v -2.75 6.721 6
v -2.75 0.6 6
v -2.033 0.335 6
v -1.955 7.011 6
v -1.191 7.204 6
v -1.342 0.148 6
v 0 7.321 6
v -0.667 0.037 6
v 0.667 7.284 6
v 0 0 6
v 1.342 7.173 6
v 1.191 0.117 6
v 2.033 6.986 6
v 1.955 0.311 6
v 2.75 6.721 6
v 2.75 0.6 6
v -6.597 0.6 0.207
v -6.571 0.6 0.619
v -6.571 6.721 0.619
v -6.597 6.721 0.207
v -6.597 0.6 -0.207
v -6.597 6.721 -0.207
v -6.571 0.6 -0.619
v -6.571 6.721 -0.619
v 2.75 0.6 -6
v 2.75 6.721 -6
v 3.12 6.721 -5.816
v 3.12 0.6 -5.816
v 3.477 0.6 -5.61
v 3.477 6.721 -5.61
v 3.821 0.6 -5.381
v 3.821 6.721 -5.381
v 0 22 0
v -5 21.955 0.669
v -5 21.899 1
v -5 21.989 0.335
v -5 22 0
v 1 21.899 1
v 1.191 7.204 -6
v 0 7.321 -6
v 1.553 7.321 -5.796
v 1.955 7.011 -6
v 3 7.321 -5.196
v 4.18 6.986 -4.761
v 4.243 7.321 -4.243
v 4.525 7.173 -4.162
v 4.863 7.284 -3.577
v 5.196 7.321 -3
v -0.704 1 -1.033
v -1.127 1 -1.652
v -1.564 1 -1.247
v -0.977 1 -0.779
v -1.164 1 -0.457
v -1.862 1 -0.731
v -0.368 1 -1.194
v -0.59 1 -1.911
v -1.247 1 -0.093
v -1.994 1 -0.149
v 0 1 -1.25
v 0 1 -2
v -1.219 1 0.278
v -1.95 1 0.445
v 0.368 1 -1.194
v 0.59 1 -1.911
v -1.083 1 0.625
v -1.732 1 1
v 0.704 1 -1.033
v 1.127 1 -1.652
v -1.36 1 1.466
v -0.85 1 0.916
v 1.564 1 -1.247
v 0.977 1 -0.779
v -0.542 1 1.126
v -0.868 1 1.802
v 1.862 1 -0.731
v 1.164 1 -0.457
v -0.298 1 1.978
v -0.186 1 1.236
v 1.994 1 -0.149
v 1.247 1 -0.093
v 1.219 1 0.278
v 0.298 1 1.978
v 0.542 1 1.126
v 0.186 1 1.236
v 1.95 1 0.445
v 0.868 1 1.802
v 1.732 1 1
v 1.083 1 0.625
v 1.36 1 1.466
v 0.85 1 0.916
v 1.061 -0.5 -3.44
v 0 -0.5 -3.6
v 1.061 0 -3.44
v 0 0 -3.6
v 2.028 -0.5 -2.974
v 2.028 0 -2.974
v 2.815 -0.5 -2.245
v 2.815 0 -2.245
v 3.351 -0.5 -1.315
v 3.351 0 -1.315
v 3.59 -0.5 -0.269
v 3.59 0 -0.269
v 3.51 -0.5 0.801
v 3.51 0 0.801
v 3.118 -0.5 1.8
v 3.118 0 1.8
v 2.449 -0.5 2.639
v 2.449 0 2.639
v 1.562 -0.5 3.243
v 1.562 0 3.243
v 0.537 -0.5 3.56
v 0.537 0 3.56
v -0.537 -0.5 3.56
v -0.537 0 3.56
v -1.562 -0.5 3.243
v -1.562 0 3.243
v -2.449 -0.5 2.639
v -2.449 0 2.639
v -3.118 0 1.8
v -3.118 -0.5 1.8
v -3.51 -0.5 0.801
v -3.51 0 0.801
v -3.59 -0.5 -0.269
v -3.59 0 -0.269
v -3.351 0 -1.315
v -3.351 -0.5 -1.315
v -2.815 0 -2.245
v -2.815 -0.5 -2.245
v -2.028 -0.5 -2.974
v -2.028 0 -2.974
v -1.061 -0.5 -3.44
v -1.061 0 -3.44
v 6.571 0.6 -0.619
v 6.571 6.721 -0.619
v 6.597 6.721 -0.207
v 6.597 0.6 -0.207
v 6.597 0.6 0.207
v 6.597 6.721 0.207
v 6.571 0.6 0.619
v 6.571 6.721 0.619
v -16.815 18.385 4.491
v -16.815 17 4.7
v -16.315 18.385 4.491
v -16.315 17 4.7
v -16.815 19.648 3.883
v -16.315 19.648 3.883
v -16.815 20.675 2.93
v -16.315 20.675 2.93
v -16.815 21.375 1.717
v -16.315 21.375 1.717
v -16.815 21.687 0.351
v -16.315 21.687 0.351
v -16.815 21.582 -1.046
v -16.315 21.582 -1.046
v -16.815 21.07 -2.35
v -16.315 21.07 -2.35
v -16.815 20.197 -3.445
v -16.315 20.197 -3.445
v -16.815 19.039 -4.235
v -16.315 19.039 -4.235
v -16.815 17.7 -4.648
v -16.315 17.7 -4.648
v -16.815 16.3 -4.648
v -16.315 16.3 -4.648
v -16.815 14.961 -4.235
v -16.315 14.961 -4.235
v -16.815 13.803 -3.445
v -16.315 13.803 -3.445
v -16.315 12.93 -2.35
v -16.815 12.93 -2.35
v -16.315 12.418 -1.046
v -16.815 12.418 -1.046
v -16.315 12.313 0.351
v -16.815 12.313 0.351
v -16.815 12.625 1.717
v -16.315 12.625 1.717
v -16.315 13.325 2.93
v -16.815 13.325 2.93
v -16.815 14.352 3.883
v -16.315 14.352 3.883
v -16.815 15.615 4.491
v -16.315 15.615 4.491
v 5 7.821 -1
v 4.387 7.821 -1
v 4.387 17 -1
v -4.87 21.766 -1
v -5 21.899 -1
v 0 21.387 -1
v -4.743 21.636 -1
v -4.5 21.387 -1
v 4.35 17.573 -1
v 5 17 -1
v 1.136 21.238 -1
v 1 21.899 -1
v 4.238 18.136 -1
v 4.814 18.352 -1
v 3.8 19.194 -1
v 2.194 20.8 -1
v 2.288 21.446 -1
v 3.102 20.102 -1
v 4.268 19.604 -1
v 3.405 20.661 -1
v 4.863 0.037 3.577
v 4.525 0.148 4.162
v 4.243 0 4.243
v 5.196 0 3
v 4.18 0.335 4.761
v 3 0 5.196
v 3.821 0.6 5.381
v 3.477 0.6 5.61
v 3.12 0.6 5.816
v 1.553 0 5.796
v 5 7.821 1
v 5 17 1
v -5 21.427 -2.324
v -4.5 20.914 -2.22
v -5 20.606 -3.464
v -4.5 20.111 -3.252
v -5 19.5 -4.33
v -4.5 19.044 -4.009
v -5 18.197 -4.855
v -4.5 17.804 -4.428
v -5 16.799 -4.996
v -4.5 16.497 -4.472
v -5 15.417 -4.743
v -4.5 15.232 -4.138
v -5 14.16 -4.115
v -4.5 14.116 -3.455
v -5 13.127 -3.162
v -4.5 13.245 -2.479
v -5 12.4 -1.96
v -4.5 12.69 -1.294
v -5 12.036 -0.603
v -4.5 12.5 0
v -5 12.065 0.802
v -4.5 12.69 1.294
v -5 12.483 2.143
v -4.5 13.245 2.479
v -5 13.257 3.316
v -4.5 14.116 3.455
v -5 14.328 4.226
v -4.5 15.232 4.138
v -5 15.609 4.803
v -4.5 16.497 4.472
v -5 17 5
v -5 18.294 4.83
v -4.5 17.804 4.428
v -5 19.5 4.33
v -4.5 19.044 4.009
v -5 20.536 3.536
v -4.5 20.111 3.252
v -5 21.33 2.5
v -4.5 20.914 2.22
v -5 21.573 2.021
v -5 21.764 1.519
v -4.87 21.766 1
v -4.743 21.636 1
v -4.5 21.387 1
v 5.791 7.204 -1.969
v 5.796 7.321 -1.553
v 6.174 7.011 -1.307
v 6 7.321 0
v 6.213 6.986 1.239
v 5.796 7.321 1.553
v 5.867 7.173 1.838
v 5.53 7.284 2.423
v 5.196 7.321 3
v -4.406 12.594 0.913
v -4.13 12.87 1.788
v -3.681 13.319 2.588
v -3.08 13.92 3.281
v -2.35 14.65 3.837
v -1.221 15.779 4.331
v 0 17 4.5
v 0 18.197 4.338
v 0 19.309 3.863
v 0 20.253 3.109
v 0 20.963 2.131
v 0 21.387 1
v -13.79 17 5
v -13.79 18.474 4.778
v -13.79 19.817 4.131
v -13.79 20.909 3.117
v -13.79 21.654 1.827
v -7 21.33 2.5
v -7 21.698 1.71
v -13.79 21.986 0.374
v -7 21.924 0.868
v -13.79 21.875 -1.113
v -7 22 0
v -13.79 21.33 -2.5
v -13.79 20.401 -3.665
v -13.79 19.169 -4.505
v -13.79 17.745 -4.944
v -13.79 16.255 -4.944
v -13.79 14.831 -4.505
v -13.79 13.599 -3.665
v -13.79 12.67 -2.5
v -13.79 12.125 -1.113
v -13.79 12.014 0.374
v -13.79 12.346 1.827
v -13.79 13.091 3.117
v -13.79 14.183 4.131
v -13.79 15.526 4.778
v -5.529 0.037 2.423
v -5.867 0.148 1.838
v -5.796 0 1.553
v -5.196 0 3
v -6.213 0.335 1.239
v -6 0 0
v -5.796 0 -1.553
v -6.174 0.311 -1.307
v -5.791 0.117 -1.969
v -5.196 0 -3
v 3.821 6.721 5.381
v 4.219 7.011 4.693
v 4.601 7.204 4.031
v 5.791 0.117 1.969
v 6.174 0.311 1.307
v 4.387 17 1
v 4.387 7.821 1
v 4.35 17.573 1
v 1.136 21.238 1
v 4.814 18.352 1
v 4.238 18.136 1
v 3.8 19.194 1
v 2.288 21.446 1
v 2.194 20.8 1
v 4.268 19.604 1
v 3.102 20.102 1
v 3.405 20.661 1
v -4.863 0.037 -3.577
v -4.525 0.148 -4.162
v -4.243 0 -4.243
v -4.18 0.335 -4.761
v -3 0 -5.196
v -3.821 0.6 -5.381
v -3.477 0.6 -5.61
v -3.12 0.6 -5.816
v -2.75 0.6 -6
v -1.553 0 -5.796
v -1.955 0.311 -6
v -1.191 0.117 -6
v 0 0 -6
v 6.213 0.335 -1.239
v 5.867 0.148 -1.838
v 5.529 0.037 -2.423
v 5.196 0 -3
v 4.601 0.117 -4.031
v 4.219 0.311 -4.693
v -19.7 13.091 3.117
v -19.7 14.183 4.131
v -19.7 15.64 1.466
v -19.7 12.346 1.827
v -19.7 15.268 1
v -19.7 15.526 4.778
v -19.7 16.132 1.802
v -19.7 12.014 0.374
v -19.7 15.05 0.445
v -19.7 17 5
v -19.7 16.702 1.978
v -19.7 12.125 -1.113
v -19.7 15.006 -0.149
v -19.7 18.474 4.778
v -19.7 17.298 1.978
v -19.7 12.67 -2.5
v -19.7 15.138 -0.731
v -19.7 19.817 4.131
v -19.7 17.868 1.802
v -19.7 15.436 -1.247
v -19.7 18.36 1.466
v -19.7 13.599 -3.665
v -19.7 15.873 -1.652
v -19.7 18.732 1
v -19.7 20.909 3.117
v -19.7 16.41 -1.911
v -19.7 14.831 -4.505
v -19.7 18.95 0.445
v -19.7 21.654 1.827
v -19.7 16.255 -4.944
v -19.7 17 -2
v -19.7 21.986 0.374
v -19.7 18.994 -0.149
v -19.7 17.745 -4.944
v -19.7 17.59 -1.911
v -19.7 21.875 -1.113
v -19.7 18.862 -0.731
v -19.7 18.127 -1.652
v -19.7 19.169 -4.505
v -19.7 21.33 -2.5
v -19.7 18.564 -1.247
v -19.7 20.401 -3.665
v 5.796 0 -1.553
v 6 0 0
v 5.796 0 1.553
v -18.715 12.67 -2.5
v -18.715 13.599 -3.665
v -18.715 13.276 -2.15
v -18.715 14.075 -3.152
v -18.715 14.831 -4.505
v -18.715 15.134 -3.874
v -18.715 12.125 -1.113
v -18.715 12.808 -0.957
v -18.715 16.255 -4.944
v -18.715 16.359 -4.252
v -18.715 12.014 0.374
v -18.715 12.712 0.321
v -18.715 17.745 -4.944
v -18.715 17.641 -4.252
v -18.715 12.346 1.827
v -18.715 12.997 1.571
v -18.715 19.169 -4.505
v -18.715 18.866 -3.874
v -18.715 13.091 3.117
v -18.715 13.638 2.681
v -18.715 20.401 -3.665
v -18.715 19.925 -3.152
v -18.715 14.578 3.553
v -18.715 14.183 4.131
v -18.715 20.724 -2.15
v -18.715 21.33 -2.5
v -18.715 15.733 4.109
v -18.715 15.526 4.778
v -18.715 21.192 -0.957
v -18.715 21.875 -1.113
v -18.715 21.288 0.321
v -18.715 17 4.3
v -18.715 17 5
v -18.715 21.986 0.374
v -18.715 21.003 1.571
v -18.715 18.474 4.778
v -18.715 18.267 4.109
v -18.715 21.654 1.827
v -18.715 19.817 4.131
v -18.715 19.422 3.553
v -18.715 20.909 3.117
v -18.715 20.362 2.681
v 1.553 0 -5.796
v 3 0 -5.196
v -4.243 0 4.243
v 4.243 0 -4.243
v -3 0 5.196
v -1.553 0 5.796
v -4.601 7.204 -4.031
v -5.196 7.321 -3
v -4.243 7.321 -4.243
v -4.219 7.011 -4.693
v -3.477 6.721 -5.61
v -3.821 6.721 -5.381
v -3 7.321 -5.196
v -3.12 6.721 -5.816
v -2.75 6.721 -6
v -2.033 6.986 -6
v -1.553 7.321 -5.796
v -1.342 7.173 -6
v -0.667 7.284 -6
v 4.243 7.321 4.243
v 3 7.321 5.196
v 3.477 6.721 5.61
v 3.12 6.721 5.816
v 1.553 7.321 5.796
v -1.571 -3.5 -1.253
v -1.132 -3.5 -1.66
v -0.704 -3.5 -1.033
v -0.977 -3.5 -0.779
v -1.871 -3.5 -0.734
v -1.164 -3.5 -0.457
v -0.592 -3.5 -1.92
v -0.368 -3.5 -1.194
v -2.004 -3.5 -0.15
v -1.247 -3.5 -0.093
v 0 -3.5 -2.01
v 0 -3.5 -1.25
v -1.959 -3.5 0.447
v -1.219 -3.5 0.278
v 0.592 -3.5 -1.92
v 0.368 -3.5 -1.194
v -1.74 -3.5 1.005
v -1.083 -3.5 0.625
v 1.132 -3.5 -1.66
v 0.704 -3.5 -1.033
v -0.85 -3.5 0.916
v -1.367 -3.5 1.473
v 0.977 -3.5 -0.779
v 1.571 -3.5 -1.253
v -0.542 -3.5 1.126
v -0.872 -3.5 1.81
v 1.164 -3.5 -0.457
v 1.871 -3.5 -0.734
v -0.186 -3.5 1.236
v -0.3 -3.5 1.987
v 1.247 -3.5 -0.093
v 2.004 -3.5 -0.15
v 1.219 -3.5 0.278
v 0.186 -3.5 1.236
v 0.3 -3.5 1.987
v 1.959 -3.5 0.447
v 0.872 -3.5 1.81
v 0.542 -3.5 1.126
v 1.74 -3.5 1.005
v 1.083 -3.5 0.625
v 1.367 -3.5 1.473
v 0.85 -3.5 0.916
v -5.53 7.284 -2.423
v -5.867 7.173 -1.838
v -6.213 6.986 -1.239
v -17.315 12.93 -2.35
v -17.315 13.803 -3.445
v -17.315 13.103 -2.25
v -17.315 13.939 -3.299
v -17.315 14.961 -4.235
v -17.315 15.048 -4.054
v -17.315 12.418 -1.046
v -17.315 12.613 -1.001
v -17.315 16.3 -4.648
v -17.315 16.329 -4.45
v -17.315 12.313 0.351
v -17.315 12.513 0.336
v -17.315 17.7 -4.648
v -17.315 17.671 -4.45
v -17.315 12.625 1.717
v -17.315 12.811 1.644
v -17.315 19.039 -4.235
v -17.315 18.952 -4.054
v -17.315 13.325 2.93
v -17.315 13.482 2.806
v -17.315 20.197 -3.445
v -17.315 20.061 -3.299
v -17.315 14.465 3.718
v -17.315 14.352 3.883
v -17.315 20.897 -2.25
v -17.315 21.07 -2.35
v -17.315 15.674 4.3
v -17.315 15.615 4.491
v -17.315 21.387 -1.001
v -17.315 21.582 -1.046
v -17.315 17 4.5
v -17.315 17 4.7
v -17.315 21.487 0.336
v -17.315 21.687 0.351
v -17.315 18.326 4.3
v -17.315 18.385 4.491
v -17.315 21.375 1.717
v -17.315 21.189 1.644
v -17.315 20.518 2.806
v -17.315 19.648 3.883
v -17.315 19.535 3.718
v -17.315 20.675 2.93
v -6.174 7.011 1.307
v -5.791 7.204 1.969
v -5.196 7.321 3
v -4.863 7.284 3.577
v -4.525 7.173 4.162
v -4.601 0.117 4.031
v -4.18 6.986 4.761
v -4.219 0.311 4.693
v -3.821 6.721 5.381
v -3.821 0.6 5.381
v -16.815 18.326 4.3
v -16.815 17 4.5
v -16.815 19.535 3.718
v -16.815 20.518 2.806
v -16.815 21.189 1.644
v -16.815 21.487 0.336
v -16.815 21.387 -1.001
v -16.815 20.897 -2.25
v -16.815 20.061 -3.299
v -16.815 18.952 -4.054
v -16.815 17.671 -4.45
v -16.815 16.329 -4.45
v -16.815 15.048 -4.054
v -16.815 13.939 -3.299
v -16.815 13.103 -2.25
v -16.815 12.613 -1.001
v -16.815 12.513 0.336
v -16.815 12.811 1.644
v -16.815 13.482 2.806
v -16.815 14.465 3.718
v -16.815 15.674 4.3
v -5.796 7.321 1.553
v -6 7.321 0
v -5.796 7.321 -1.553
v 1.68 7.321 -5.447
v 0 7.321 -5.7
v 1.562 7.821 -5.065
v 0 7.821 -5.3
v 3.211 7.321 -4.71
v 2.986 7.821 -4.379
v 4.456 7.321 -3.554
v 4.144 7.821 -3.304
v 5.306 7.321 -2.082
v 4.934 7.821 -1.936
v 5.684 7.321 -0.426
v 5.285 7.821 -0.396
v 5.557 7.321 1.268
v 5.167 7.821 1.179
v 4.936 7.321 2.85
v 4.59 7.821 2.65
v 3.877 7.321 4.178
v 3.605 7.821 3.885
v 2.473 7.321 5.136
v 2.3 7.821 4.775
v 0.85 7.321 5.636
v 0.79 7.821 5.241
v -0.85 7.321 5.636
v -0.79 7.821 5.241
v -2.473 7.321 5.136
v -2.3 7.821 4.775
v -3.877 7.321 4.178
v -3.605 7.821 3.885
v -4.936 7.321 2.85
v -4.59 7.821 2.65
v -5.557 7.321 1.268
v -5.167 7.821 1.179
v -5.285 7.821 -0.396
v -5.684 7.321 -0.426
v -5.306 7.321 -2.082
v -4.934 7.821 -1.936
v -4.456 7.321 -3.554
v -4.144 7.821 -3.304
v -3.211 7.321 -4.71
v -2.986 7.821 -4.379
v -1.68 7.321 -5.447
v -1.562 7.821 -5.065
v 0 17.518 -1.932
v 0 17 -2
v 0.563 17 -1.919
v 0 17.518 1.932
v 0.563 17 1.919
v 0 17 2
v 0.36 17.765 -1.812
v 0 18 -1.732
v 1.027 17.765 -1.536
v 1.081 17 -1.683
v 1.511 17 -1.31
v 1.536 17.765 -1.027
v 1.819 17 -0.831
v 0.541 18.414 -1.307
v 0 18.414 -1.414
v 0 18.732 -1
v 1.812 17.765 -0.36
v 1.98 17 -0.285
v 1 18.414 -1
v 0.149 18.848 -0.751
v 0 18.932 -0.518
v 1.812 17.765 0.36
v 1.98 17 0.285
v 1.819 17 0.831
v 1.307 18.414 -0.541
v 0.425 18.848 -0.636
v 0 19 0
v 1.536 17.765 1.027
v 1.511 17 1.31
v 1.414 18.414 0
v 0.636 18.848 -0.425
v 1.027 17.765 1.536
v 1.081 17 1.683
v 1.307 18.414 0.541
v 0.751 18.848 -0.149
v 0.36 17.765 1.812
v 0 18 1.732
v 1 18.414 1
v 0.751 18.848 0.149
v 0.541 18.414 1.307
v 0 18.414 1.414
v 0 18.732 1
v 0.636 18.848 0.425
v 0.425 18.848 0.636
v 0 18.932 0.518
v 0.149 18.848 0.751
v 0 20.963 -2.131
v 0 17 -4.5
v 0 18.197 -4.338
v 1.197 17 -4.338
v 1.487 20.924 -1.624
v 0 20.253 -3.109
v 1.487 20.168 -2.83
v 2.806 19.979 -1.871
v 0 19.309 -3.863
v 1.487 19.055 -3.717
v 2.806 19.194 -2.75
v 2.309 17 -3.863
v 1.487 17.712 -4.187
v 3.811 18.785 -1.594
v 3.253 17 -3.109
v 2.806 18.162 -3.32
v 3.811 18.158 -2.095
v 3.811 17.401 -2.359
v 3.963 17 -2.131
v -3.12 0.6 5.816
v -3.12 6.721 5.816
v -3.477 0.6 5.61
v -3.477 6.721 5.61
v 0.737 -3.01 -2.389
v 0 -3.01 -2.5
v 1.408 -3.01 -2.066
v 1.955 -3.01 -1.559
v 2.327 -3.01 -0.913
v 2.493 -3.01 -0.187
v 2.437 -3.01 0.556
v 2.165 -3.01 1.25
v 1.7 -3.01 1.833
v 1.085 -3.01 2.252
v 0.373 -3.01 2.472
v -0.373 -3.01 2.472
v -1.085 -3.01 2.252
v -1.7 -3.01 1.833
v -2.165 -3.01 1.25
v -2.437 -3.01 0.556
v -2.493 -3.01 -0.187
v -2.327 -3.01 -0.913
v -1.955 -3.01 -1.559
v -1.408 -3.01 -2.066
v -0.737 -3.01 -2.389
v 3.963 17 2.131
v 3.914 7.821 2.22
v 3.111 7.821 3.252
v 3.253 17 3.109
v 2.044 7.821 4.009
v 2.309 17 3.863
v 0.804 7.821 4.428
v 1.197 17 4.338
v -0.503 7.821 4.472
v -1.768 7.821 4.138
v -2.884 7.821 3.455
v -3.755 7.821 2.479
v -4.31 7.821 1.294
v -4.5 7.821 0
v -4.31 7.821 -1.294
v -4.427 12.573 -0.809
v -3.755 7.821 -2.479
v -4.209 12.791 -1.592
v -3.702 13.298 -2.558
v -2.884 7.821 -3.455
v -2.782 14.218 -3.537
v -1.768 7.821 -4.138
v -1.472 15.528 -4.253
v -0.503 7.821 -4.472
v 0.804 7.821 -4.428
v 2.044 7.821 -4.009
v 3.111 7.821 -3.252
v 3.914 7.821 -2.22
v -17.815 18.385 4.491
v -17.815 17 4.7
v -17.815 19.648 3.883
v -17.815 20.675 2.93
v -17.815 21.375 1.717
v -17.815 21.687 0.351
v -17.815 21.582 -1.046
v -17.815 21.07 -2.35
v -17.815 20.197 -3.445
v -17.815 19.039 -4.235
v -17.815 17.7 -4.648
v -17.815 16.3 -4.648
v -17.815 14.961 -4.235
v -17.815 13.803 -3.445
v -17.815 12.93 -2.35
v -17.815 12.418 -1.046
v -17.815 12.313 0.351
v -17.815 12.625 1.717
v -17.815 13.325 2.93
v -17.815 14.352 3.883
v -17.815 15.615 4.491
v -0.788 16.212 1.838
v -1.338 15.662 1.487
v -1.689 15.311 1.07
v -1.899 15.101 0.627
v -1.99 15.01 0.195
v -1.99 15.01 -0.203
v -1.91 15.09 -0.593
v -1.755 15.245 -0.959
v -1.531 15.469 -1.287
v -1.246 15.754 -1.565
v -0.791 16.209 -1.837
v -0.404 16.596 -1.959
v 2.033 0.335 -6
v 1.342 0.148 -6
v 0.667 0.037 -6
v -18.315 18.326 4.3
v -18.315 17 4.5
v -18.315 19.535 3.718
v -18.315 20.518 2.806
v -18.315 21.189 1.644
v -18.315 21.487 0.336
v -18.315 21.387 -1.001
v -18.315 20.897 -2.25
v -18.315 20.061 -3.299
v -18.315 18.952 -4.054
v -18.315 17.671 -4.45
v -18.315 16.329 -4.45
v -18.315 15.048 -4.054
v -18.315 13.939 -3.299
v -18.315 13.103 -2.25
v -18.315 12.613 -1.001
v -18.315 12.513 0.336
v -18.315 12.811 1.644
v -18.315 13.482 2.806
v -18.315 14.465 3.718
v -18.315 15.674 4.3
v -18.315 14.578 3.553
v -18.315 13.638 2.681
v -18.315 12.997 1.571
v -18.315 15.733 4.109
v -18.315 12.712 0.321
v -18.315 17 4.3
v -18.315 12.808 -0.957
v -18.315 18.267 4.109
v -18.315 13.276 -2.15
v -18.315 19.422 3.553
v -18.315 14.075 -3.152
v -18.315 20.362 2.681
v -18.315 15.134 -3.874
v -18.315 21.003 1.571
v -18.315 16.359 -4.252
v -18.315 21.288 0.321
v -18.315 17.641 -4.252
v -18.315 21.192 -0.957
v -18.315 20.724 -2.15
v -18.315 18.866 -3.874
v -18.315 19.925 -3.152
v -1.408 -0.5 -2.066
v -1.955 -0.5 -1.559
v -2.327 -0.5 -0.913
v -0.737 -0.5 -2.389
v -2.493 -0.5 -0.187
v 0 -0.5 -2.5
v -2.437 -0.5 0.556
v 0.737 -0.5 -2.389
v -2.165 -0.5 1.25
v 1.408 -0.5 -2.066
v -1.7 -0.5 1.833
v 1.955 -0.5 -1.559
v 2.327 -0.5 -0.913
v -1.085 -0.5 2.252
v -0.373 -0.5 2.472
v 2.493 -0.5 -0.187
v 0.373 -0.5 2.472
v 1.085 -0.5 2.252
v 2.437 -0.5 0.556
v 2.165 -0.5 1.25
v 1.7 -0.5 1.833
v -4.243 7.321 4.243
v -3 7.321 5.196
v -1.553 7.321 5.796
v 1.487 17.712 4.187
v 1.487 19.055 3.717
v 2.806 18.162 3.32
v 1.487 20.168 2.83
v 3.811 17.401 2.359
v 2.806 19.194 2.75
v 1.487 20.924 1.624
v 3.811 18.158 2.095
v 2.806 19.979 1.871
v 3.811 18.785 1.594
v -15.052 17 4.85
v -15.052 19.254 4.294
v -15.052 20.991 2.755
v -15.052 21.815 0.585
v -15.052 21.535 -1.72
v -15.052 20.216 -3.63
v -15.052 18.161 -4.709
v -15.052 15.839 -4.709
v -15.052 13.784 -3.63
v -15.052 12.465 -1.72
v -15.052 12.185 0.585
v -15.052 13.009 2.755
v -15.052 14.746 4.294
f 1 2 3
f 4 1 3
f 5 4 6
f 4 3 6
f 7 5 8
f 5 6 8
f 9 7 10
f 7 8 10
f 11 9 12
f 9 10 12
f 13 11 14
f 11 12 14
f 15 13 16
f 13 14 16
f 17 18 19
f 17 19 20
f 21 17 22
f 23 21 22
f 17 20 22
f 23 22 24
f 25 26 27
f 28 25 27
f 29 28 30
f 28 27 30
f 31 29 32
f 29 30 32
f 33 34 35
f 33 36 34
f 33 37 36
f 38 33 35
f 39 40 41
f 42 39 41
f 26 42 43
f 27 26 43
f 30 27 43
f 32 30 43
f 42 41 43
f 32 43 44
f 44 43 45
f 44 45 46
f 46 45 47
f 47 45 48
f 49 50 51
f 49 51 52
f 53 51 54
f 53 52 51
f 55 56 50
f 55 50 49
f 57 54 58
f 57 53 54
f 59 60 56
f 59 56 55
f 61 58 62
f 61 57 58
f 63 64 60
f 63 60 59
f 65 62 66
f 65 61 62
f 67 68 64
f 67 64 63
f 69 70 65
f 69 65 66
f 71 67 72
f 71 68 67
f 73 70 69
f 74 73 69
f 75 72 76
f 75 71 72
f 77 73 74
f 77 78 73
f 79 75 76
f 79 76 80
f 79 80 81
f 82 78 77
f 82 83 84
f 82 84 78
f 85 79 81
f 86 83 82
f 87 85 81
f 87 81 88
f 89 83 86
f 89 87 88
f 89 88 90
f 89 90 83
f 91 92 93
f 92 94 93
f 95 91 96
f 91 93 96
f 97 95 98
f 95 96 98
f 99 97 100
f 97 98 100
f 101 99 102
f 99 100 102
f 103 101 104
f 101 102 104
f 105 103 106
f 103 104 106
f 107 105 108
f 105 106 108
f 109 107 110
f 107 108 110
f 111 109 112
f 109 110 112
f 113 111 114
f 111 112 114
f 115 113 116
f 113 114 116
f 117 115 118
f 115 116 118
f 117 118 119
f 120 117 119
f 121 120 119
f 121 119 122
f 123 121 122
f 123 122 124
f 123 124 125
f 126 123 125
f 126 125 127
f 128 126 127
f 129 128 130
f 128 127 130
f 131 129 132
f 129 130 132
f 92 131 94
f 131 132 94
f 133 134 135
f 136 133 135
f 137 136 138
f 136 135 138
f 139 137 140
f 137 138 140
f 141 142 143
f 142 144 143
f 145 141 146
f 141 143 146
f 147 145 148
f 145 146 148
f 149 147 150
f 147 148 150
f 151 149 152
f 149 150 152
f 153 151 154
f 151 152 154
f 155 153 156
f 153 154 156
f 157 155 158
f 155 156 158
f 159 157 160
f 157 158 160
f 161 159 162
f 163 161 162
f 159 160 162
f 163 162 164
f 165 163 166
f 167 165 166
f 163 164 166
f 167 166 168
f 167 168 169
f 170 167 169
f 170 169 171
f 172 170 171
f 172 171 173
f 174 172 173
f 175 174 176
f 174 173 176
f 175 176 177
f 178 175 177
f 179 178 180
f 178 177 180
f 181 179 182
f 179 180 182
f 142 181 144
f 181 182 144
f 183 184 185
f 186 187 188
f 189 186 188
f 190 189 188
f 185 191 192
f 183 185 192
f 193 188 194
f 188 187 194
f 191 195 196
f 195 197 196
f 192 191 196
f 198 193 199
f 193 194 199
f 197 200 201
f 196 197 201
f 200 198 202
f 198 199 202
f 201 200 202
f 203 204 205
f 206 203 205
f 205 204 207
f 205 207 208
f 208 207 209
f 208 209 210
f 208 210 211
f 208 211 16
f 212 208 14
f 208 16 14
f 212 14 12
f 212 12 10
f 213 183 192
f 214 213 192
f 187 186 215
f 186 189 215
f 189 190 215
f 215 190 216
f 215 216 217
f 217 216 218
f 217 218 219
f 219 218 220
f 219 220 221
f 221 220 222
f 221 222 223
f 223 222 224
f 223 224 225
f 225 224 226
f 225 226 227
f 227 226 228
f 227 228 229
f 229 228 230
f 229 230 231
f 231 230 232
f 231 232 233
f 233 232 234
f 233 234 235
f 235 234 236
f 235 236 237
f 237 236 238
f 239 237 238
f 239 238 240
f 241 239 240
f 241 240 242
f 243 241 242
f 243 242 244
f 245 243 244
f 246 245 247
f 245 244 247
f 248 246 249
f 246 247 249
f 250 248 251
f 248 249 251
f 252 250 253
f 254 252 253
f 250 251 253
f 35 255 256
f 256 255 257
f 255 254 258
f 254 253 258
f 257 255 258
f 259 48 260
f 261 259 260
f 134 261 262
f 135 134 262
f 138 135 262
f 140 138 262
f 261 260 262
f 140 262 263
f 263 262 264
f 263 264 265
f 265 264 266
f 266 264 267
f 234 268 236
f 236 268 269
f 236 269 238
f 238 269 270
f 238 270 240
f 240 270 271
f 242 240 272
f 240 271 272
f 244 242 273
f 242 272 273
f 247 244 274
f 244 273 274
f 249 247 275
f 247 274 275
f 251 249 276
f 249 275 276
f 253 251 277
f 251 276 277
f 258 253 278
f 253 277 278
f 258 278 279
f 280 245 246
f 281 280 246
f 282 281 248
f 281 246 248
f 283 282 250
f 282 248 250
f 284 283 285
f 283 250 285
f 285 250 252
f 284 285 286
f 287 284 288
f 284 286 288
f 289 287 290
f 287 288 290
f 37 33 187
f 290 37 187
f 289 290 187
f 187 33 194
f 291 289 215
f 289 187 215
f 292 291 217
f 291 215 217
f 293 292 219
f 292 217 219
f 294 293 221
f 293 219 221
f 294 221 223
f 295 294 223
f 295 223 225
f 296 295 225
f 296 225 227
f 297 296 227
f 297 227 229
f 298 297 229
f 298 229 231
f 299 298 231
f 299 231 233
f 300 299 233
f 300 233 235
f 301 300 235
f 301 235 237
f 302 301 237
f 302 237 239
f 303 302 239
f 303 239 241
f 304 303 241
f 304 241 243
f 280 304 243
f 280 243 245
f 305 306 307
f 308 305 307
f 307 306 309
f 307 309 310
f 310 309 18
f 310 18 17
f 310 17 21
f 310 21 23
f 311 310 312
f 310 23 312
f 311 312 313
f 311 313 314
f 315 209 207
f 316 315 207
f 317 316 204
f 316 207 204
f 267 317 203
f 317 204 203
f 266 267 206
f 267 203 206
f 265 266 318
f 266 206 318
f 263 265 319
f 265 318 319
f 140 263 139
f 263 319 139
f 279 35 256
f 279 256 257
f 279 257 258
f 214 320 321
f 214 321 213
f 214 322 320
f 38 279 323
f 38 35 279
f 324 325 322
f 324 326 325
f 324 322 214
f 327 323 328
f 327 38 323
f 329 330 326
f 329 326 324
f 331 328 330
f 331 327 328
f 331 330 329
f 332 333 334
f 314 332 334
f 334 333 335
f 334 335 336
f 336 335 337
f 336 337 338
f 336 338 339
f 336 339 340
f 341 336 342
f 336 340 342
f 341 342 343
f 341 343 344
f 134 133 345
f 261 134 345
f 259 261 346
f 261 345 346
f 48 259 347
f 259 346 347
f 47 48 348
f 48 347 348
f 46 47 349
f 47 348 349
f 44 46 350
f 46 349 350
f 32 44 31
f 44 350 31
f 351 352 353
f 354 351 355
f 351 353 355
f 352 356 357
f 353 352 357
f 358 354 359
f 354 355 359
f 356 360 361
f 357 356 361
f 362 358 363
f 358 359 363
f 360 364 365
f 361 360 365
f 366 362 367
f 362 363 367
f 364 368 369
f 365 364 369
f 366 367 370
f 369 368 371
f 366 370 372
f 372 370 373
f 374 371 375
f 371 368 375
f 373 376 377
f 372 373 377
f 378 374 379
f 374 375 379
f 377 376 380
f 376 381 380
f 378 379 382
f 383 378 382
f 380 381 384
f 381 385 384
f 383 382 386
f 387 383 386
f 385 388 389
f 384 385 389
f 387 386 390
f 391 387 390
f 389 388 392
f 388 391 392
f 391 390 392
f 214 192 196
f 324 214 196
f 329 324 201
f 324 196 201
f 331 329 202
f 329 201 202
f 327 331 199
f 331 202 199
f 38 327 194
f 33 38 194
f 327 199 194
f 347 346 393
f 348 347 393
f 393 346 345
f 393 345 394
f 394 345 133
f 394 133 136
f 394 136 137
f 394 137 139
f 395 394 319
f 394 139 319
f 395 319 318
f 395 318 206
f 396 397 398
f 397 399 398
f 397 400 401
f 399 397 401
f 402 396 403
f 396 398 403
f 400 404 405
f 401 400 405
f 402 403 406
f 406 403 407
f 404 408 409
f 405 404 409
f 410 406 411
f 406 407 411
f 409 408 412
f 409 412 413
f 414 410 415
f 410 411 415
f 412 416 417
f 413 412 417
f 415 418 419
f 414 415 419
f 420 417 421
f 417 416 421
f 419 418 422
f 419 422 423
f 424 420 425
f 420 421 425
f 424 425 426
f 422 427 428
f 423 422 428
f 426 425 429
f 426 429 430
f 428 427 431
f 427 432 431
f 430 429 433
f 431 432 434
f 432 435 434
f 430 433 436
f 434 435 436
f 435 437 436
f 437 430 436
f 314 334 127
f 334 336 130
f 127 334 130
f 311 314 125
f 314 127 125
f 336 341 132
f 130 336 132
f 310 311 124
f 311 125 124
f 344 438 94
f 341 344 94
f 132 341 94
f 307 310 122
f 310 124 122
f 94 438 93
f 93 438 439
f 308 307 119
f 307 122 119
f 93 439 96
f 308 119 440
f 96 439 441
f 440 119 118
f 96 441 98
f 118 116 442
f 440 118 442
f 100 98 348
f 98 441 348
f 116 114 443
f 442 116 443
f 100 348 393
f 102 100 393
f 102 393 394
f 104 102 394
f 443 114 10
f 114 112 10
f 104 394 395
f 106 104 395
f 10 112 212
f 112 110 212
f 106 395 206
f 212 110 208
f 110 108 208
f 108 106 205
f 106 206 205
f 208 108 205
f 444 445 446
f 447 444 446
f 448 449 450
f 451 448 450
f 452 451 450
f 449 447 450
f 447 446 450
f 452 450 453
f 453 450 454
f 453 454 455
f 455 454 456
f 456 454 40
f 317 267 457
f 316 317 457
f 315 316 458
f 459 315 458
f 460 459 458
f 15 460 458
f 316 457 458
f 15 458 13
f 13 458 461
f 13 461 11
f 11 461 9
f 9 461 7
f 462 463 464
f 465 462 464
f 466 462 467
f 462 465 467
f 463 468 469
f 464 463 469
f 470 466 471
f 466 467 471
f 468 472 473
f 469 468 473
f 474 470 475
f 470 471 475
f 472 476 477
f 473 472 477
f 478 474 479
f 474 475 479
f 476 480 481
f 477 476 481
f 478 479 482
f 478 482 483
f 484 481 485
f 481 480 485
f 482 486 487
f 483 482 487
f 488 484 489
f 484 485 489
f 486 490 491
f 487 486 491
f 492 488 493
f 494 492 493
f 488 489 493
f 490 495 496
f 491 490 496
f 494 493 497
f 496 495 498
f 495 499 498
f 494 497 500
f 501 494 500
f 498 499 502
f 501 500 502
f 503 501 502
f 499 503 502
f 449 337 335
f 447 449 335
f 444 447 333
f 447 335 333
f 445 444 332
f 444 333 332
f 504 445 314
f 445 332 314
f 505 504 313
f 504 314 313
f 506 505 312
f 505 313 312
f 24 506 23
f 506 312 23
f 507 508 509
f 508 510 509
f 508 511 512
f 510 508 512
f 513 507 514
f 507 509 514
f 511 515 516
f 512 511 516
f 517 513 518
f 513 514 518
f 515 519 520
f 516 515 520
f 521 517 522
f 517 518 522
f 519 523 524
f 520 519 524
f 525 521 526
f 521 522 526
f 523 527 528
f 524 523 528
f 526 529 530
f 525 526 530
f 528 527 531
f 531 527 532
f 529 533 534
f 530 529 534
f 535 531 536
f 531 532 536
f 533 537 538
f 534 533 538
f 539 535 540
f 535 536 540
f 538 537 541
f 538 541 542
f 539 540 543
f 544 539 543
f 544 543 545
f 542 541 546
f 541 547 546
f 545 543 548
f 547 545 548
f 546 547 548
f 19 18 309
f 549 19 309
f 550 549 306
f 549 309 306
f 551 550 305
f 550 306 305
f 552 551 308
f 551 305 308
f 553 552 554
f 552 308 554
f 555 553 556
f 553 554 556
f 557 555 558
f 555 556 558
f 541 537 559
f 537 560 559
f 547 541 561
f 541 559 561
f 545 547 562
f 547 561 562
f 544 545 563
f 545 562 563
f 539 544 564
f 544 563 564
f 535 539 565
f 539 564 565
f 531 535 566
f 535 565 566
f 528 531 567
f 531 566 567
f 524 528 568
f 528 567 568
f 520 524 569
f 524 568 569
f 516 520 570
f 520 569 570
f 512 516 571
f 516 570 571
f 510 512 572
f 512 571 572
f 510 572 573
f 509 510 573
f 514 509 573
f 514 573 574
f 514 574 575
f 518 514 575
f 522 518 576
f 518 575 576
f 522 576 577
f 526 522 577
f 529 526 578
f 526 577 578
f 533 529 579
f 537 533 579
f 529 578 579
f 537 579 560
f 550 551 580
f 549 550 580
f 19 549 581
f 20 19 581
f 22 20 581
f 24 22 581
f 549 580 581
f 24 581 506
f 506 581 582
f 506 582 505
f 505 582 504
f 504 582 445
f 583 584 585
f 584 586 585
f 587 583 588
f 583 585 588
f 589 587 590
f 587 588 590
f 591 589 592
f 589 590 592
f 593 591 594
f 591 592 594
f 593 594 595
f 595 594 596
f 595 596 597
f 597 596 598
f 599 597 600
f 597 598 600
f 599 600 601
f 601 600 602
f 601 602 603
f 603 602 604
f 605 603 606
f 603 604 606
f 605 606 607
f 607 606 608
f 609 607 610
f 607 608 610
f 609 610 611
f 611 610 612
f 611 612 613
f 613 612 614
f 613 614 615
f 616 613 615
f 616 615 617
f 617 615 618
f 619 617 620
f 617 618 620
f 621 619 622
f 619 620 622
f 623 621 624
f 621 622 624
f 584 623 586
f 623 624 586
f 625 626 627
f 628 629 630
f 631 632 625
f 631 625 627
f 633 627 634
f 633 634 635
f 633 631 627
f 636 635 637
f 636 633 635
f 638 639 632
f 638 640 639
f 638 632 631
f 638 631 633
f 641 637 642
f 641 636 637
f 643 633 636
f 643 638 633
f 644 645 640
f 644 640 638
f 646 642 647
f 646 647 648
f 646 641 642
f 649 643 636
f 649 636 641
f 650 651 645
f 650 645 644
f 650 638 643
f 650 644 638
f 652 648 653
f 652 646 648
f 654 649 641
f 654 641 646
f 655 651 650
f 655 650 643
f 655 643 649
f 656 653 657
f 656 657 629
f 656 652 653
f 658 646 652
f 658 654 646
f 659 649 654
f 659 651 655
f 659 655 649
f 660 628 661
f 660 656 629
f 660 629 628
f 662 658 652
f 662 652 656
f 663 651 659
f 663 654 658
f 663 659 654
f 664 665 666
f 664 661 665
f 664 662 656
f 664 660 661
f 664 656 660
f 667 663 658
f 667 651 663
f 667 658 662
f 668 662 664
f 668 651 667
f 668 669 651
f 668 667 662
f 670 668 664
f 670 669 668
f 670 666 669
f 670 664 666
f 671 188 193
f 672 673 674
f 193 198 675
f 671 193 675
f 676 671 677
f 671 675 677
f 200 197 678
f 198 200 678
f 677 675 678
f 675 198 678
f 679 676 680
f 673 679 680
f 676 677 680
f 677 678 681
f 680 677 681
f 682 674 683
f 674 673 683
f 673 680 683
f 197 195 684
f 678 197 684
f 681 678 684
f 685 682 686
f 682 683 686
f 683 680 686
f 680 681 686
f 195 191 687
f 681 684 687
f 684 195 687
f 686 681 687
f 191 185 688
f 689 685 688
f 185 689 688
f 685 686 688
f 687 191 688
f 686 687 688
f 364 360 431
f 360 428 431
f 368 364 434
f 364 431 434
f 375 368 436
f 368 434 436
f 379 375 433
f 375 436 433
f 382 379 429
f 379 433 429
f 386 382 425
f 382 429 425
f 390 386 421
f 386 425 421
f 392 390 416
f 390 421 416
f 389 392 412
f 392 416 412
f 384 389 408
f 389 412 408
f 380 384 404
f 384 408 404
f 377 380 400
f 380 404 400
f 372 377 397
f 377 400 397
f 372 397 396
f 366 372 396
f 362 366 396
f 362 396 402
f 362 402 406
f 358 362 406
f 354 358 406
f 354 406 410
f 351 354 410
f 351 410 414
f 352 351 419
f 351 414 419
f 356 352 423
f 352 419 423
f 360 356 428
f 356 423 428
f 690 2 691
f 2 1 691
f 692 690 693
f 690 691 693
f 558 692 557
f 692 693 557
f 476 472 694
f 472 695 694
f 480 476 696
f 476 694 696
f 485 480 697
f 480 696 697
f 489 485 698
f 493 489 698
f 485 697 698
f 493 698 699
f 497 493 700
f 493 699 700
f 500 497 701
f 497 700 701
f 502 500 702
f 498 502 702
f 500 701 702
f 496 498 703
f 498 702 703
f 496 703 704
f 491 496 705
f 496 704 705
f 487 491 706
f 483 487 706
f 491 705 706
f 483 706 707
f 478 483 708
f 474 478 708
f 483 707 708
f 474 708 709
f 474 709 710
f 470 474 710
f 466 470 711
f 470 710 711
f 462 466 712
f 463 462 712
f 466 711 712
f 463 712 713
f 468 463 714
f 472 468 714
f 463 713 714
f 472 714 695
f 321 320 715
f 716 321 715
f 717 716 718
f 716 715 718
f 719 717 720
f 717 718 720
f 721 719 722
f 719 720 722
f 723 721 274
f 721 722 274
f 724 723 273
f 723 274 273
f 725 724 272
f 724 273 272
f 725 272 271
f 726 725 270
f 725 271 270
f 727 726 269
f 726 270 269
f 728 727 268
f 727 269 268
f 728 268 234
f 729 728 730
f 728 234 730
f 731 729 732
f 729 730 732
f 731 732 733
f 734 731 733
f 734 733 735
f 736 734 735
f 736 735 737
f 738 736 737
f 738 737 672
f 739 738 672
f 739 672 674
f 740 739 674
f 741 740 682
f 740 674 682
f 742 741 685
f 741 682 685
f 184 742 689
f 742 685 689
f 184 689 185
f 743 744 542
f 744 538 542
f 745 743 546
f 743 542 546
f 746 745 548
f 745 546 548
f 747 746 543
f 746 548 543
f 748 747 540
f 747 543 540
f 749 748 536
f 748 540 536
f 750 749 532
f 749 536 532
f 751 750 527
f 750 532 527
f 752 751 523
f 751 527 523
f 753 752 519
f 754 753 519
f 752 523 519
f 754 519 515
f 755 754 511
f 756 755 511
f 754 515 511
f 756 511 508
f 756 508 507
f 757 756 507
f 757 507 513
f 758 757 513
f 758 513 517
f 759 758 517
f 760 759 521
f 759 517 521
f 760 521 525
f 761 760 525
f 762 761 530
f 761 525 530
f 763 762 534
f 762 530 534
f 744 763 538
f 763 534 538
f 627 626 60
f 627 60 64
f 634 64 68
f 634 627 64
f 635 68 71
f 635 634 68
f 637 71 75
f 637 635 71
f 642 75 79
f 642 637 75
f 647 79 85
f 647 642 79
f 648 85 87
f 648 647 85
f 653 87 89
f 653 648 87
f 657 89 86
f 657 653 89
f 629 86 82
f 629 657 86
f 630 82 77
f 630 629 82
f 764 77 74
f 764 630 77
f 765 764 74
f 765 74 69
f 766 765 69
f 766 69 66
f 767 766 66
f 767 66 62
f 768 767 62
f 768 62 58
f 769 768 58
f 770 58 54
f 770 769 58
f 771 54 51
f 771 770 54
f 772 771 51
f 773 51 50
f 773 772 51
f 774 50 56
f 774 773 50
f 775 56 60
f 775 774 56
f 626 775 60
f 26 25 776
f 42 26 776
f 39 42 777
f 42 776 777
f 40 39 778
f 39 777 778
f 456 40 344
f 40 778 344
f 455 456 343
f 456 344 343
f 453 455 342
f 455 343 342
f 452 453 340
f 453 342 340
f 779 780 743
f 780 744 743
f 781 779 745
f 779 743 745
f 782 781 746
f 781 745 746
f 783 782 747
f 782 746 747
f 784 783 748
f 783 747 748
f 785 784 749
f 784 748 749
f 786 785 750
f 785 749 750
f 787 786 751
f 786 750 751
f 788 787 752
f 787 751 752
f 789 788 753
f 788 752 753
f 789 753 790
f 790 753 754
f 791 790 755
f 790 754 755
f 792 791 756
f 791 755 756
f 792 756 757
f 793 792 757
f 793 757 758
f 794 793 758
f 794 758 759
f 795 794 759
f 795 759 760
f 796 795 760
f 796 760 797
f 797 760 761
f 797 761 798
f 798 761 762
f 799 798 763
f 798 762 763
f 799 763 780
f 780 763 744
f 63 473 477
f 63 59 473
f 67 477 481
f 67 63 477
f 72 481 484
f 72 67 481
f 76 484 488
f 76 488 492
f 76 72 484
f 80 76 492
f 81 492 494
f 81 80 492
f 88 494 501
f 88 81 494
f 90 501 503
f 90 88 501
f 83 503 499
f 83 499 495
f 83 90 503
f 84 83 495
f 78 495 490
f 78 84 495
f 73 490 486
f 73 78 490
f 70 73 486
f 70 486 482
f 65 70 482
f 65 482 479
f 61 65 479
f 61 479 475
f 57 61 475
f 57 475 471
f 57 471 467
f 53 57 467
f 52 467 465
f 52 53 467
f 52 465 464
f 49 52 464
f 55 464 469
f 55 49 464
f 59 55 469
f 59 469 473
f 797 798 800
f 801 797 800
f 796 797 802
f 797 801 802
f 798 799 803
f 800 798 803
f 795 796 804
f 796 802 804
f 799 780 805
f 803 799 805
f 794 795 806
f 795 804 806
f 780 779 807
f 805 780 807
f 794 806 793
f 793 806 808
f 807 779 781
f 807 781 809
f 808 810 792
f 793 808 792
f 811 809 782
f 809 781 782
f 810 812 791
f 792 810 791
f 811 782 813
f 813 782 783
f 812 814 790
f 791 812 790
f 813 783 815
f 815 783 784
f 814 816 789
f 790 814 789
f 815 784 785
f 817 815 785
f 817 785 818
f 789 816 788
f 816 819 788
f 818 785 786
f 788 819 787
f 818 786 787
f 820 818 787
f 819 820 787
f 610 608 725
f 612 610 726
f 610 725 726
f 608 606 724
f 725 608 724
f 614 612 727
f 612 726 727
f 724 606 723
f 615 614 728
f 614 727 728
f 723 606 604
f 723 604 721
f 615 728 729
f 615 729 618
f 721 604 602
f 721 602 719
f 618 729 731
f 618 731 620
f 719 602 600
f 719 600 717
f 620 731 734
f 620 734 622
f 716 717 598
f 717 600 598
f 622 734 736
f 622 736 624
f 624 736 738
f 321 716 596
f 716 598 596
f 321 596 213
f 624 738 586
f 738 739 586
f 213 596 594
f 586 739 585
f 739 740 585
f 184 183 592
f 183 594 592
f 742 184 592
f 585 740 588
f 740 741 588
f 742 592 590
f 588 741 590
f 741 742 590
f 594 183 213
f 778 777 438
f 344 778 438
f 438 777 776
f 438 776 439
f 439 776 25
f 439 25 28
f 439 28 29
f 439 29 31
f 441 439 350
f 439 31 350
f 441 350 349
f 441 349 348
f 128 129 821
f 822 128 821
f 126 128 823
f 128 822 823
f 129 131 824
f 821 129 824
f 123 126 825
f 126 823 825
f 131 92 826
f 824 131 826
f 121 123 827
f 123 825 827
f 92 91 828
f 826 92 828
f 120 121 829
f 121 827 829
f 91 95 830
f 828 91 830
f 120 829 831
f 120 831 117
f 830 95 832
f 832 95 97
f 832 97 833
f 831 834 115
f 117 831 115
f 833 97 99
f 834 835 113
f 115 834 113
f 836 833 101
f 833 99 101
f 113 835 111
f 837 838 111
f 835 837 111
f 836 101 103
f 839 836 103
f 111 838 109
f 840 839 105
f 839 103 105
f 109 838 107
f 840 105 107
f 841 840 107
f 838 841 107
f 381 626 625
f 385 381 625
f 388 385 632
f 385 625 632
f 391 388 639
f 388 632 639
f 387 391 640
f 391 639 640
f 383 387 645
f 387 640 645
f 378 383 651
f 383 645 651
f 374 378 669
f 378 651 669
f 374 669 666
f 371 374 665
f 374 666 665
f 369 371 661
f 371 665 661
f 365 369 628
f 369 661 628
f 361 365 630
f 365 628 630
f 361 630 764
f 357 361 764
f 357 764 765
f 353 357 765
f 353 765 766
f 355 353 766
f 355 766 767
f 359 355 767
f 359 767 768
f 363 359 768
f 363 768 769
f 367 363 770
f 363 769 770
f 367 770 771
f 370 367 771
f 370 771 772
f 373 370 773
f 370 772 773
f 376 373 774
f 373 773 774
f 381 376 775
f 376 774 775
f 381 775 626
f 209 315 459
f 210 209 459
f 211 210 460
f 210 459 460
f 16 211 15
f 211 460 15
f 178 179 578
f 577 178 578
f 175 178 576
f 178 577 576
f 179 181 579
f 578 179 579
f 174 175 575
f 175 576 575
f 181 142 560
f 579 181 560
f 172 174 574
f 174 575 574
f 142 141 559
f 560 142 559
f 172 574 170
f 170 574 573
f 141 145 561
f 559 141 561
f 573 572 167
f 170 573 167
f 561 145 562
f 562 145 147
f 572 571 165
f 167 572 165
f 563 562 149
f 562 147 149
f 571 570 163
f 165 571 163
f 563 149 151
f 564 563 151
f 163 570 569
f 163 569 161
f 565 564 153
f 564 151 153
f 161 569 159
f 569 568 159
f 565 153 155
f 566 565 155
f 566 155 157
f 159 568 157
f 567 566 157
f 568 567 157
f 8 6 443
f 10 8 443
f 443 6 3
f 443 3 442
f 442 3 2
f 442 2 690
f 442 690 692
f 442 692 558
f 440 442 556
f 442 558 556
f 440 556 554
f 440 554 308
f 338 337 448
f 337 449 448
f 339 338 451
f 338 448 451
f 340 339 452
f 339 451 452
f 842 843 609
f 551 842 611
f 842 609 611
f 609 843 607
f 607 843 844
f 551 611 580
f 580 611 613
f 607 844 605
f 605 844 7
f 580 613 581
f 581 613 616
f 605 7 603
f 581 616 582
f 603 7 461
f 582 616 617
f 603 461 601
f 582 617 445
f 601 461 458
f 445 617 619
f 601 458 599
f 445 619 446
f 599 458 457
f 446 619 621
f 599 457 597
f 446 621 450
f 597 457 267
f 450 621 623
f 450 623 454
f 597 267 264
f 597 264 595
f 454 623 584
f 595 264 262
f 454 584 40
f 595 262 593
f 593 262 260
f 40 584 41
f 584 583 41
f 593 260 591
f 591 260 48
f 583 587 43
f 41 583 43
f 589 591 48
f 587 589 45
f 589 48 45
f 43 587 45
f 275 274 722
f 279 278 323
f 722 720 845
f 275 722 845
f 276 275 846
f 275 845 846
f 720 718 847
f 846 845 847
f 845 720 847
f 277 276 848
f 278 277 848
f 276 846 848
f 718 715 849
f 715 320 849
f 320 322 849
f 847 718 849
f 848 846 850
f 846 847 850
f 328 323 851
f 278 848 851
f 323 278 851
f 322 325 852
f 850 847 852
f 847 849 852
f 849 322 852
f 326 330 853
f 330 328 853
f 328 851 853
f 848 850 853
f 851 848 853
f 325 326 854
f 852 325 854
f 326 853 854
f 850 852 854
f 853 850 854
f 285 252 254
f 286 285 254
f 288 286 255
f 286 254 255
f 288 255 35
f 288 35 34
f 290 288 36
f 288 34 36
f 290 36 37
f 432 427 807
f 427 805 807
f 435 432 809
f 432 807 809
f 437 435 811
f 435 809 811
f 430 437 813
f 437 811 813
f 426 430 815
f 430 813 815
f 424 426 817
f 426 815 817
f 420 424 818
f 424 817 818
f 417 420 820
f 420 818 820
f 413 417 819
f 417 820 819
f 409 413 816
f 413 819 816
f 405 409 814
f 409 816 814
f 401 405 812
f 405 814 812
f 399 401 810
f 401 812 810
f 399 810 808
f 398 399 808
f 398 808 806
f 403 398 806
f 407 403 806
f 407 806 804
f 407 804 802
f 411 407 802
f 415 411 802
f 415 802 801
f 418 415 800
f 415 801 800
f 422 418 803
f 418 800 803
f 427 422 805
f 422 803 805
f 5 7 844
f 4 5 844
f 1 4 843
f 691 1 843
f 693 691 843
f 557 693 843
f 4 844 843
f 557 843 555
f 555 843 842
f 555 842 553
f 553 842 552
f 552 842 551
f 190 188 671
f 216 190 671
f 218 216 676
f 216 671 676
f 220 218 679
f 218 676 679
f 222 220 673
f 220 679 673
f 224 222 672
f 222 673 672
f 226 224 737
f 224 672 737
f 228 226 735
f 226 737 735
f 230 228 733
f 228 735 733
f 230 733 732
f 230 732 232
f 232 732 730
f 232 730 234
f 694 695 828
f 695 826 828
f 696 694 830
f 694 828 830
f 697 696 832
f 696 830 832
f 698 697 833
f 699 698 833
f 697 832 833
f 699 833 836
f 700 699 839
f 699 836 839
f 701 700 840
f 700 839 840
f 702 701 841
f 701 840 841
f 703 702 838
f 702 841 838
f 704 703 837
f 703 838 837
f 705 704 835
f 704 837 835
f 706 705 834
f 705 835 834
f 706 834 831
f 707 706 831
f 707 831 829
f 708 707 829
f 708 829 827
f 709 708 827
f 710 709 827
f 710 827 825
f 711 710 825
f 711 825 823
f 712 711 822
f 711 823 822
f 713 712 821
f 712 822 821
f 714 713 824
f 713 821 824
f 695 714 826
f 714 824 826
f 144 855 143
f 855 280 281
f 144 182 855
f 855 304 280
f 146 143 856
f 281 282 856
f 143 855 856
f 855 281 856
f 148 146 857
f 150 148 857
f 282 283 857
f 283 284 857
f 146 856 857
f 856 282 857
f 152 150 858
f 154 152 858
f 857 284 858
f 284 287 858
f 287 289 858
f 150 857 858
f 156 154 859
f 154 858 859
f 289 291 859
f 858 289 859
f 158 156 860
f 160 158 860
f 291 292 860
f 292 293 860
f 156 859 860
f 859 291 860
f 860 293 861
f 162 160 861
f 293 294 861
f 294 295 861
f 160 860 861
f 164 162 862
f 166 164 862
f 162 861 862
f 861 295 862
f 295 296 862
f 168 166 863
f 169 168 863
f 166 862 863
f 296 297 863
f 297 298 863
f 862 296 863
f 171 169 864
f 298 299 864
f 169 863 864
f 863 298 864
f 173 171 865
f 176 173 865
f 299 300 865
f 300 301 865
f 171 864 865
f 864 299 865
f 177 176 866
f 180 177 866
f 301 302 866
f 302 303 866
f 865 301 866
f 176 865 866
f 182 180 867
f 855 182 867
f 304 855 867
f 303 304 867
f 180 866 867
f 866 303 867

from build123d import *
from build123d.topology import SkipClean

# Parameters (mm, degrees)
SKETCH3_W                    = 24
SKETCH3_H                    = 24
CUT_EXTRUDE1_DEPTH           = 8.2
BOSS_EXTRUDE1_DEPTH          = 1
BOSS_EXTRUDE1_DEPTH_BACK     = 1
SKETCH6_R                    = 2
CUT_EXTRUDE2_DEPTH           = 19.7
SKETCH8_W                    = 10
SKETCH8_H                    = 2
CUT_REVOLVE2_ANGLE           = 30
CUT_REVOLVE2_OTHER_WAY_ANGLE = 30


with BuildPart() as part:
    # Sketch1 → Revolve1 (revolve)
    with BuildSketch(Plane.XY, mode=Mode.PRIVATE) as revolve1_sk:
        Polygon((0, 0), (-6, 0), (-6.6, 0.6), (-6.6, 6.721428571), (-6, 7.321428571), (-5.7, 7.321428571), (-5.3, 7.821428571), (-4.5, 7.821428571), (-4.5, 17), (0, 17), align=None)
    revolve(revolve1_sk.sketch.rotate(Axis((0, 17, 0), (0, -1, 0)), 90), axis=Axis((0, 17, 0), (0, -1, 0)))

    # Sketch2 → Revolve2 (revolve)
    with BuildSketch(Plane.XY, mode=Mode.PRIVATE) as revolve2_sk:
        Polygon((0, -3.5), (-2.0095, -3.5), (-2.5, -3.0095), (-2.5, -0.5), (-3.6, -0.5), (-3.6, 0), (0, 0), align=None)
    revolve(revolve2_sk.sketch.rotate(Axis((0, 0, 0), (0, -1, 0)), 90), axis=Axis((0, 0, 0), (0, -1, 0)))

    # Sketch3 → Cut-Extrude1 (cut)
    with BuildSketch(Plane(origin=(0, 0, 0), x_dir=(1, 0, 0), z_dir=(0, 1, 0))):
        Rectangle(SKETCH3_W, SKETCH3_H)
        Polygon((-6.92820323, 0), (-3.464101615, -6), (3.464101615, -6), (6.92820323, 0), (3.464101615, 6), (-3.464101615, 6), align=None, mode=Mode.SUBTRACT)
    extrude(amount=CUT_EXTRUDE1_DEPTH, mode=Mode.SUBTRACT)

    # Sketch4 → Revolve3 (revolve)
    with SkipClean():  # the faces are left unmerged after this step: merging them gives an invalid solid
        with BuildSketch(Plane.XY, mode=Mode.PRIVATE) as revolve3_sk:
            with BuildLine():
                Line((-19.7, 17), (-19.7, 22))
                Line((-19.7, 22), (-18.715, 22))
                Line((-18.715, 22), (-18.715, 21.3))
                Line((-18.715, 21.3), (-18.315, 21.3))
                Line((-18.315, 21.3), (-18.315, 21.5))
                Line((-18.315, 21.5), (-17.815, 21.7))
                Line((-17.815, 21.7), (-17.315, 21.7))
                Line((-17.315, 21.7), (-17.315, 21.5))
                Line((-17.315, 21.5), (-16.815, 21.5))
                Line((-16.815, 21.5), (-16.815, 21.7))
                Line((-16.815, 21.7), (-16.315, 21.7))
                Line((-16.315, 21.7), (-13.79, 22))
                Line((-13.79, 22), (-5, 22))
                Line((-5, 22), (-4.5, 21.5))
                Line((-4.5, 21.5), (0, 21.5))
                ThreePointArc((0, 21.5), (3.181980515, 20.181980515), (4.5, 17))
                Line((4.5, 17), (-19.7, 17))
            make_face()
        revolve(revolve3_sk.sketch.rotate(Axis((4.5, 17, 0), (-1, 0, 0)), 270), axis=Axis((4.5, 17, 0), (-1, 0, 0)))

    # Sketch5 → Boss-Extrude1 (add, two sides: drawn at the far end of the back side and taken through both)
    with BuildSketch(Plane.XY.offset(-BOSS_EXTRUDE1_DEPTH_BACK)):
        with BuildLine():
            Line((-5, 17), (0, 17))
            Line((0, 17), (0, 5.7))
            Line((0, 5.7), (5, 5.7))
            Line((5, 5.7), (5, 17))
            ThreePointArc((5, 17), (3.535533906, 20.535533906), (0, 22))
            Line((0, 22), (-5, 22))
            Line((-5, 22), (-5, 17))
        make_face()
    extrude(amount=BOSS_EXTRUDE1_DEPTH + BOSS_EXTRUDE1_DEPTH_BACK)

    # Sketch6 → Cut-Extrude2 (cut)
    with BuildSketch(Plane(origin=(0, 0, 0), x_dir=(0, 0, -1), z_dir=(1, 0, 0))):
        with Locations((0, 17)):
            Circle(SKETCH6_R)
    extrude(amount=-CUT_EXTRUDE2_DEPTH, mode=Mode.SUBTRACT)

    # Sketch7 → Cut-Revolve1 (revolve, cut)
    with BuildSketch(Plane.XY, mode=Mode.PRIVATE) as cut_revolve1_sk:
        with BuildLine():
            Line((0, -3.5), (-1.25, -3.5))
            Line((-1.25, -3.5), (-1.25, 1))
            Line((-1.25, 1), (-2, 1))
            Line((-2, 1), (-2, 17))
            ThreePointArc((-2, 17), (-1.414213562, 18.414213562), (0, 19))
            Line((0, 19), (0, -3.5))
        make_face()
    revolve(cut_revolve1_sk.sketch.rotate(Axis((0, 19, 0), (0, -1, 0)), 90), axis=Axis((0, 19, 0), (0, -1, 0)), mode=Mode.SUBTRACT)

    # Sketch8 → Cut-Revolve2 (revolve, cut)
    with BuildSketch(Plane.XY):
        with Locations((-2, 23)):
            Rectangle(SKETCH8_W, SKETCH8_H)
    revolve(axis=Axis((3, 17, 0), (-1, 0, 0)), revolution_arc=CUT_REVOLVE2_ANGLE, mode=Mode.SUBTRACT)

    # Sketch8 → Cut-Revolve2 other way (revolve, cut)
    with SkipClean():  # the faces are left unmerged after this step: merging them gives an invalid solid
        with BuildSketch(Plane.XY):
            with Locations((-2, 23)):
                Rectangle(SKETCH8_W, SKETCH8_H)
        revolve(axis=Axis((3, 17, 0), (1, 0, 0)), revolution_arc=CUT_REVOLVE2_OTHER_WAY_ANGLE, mode=Mode.SUBTRACT)


solid = part.part
